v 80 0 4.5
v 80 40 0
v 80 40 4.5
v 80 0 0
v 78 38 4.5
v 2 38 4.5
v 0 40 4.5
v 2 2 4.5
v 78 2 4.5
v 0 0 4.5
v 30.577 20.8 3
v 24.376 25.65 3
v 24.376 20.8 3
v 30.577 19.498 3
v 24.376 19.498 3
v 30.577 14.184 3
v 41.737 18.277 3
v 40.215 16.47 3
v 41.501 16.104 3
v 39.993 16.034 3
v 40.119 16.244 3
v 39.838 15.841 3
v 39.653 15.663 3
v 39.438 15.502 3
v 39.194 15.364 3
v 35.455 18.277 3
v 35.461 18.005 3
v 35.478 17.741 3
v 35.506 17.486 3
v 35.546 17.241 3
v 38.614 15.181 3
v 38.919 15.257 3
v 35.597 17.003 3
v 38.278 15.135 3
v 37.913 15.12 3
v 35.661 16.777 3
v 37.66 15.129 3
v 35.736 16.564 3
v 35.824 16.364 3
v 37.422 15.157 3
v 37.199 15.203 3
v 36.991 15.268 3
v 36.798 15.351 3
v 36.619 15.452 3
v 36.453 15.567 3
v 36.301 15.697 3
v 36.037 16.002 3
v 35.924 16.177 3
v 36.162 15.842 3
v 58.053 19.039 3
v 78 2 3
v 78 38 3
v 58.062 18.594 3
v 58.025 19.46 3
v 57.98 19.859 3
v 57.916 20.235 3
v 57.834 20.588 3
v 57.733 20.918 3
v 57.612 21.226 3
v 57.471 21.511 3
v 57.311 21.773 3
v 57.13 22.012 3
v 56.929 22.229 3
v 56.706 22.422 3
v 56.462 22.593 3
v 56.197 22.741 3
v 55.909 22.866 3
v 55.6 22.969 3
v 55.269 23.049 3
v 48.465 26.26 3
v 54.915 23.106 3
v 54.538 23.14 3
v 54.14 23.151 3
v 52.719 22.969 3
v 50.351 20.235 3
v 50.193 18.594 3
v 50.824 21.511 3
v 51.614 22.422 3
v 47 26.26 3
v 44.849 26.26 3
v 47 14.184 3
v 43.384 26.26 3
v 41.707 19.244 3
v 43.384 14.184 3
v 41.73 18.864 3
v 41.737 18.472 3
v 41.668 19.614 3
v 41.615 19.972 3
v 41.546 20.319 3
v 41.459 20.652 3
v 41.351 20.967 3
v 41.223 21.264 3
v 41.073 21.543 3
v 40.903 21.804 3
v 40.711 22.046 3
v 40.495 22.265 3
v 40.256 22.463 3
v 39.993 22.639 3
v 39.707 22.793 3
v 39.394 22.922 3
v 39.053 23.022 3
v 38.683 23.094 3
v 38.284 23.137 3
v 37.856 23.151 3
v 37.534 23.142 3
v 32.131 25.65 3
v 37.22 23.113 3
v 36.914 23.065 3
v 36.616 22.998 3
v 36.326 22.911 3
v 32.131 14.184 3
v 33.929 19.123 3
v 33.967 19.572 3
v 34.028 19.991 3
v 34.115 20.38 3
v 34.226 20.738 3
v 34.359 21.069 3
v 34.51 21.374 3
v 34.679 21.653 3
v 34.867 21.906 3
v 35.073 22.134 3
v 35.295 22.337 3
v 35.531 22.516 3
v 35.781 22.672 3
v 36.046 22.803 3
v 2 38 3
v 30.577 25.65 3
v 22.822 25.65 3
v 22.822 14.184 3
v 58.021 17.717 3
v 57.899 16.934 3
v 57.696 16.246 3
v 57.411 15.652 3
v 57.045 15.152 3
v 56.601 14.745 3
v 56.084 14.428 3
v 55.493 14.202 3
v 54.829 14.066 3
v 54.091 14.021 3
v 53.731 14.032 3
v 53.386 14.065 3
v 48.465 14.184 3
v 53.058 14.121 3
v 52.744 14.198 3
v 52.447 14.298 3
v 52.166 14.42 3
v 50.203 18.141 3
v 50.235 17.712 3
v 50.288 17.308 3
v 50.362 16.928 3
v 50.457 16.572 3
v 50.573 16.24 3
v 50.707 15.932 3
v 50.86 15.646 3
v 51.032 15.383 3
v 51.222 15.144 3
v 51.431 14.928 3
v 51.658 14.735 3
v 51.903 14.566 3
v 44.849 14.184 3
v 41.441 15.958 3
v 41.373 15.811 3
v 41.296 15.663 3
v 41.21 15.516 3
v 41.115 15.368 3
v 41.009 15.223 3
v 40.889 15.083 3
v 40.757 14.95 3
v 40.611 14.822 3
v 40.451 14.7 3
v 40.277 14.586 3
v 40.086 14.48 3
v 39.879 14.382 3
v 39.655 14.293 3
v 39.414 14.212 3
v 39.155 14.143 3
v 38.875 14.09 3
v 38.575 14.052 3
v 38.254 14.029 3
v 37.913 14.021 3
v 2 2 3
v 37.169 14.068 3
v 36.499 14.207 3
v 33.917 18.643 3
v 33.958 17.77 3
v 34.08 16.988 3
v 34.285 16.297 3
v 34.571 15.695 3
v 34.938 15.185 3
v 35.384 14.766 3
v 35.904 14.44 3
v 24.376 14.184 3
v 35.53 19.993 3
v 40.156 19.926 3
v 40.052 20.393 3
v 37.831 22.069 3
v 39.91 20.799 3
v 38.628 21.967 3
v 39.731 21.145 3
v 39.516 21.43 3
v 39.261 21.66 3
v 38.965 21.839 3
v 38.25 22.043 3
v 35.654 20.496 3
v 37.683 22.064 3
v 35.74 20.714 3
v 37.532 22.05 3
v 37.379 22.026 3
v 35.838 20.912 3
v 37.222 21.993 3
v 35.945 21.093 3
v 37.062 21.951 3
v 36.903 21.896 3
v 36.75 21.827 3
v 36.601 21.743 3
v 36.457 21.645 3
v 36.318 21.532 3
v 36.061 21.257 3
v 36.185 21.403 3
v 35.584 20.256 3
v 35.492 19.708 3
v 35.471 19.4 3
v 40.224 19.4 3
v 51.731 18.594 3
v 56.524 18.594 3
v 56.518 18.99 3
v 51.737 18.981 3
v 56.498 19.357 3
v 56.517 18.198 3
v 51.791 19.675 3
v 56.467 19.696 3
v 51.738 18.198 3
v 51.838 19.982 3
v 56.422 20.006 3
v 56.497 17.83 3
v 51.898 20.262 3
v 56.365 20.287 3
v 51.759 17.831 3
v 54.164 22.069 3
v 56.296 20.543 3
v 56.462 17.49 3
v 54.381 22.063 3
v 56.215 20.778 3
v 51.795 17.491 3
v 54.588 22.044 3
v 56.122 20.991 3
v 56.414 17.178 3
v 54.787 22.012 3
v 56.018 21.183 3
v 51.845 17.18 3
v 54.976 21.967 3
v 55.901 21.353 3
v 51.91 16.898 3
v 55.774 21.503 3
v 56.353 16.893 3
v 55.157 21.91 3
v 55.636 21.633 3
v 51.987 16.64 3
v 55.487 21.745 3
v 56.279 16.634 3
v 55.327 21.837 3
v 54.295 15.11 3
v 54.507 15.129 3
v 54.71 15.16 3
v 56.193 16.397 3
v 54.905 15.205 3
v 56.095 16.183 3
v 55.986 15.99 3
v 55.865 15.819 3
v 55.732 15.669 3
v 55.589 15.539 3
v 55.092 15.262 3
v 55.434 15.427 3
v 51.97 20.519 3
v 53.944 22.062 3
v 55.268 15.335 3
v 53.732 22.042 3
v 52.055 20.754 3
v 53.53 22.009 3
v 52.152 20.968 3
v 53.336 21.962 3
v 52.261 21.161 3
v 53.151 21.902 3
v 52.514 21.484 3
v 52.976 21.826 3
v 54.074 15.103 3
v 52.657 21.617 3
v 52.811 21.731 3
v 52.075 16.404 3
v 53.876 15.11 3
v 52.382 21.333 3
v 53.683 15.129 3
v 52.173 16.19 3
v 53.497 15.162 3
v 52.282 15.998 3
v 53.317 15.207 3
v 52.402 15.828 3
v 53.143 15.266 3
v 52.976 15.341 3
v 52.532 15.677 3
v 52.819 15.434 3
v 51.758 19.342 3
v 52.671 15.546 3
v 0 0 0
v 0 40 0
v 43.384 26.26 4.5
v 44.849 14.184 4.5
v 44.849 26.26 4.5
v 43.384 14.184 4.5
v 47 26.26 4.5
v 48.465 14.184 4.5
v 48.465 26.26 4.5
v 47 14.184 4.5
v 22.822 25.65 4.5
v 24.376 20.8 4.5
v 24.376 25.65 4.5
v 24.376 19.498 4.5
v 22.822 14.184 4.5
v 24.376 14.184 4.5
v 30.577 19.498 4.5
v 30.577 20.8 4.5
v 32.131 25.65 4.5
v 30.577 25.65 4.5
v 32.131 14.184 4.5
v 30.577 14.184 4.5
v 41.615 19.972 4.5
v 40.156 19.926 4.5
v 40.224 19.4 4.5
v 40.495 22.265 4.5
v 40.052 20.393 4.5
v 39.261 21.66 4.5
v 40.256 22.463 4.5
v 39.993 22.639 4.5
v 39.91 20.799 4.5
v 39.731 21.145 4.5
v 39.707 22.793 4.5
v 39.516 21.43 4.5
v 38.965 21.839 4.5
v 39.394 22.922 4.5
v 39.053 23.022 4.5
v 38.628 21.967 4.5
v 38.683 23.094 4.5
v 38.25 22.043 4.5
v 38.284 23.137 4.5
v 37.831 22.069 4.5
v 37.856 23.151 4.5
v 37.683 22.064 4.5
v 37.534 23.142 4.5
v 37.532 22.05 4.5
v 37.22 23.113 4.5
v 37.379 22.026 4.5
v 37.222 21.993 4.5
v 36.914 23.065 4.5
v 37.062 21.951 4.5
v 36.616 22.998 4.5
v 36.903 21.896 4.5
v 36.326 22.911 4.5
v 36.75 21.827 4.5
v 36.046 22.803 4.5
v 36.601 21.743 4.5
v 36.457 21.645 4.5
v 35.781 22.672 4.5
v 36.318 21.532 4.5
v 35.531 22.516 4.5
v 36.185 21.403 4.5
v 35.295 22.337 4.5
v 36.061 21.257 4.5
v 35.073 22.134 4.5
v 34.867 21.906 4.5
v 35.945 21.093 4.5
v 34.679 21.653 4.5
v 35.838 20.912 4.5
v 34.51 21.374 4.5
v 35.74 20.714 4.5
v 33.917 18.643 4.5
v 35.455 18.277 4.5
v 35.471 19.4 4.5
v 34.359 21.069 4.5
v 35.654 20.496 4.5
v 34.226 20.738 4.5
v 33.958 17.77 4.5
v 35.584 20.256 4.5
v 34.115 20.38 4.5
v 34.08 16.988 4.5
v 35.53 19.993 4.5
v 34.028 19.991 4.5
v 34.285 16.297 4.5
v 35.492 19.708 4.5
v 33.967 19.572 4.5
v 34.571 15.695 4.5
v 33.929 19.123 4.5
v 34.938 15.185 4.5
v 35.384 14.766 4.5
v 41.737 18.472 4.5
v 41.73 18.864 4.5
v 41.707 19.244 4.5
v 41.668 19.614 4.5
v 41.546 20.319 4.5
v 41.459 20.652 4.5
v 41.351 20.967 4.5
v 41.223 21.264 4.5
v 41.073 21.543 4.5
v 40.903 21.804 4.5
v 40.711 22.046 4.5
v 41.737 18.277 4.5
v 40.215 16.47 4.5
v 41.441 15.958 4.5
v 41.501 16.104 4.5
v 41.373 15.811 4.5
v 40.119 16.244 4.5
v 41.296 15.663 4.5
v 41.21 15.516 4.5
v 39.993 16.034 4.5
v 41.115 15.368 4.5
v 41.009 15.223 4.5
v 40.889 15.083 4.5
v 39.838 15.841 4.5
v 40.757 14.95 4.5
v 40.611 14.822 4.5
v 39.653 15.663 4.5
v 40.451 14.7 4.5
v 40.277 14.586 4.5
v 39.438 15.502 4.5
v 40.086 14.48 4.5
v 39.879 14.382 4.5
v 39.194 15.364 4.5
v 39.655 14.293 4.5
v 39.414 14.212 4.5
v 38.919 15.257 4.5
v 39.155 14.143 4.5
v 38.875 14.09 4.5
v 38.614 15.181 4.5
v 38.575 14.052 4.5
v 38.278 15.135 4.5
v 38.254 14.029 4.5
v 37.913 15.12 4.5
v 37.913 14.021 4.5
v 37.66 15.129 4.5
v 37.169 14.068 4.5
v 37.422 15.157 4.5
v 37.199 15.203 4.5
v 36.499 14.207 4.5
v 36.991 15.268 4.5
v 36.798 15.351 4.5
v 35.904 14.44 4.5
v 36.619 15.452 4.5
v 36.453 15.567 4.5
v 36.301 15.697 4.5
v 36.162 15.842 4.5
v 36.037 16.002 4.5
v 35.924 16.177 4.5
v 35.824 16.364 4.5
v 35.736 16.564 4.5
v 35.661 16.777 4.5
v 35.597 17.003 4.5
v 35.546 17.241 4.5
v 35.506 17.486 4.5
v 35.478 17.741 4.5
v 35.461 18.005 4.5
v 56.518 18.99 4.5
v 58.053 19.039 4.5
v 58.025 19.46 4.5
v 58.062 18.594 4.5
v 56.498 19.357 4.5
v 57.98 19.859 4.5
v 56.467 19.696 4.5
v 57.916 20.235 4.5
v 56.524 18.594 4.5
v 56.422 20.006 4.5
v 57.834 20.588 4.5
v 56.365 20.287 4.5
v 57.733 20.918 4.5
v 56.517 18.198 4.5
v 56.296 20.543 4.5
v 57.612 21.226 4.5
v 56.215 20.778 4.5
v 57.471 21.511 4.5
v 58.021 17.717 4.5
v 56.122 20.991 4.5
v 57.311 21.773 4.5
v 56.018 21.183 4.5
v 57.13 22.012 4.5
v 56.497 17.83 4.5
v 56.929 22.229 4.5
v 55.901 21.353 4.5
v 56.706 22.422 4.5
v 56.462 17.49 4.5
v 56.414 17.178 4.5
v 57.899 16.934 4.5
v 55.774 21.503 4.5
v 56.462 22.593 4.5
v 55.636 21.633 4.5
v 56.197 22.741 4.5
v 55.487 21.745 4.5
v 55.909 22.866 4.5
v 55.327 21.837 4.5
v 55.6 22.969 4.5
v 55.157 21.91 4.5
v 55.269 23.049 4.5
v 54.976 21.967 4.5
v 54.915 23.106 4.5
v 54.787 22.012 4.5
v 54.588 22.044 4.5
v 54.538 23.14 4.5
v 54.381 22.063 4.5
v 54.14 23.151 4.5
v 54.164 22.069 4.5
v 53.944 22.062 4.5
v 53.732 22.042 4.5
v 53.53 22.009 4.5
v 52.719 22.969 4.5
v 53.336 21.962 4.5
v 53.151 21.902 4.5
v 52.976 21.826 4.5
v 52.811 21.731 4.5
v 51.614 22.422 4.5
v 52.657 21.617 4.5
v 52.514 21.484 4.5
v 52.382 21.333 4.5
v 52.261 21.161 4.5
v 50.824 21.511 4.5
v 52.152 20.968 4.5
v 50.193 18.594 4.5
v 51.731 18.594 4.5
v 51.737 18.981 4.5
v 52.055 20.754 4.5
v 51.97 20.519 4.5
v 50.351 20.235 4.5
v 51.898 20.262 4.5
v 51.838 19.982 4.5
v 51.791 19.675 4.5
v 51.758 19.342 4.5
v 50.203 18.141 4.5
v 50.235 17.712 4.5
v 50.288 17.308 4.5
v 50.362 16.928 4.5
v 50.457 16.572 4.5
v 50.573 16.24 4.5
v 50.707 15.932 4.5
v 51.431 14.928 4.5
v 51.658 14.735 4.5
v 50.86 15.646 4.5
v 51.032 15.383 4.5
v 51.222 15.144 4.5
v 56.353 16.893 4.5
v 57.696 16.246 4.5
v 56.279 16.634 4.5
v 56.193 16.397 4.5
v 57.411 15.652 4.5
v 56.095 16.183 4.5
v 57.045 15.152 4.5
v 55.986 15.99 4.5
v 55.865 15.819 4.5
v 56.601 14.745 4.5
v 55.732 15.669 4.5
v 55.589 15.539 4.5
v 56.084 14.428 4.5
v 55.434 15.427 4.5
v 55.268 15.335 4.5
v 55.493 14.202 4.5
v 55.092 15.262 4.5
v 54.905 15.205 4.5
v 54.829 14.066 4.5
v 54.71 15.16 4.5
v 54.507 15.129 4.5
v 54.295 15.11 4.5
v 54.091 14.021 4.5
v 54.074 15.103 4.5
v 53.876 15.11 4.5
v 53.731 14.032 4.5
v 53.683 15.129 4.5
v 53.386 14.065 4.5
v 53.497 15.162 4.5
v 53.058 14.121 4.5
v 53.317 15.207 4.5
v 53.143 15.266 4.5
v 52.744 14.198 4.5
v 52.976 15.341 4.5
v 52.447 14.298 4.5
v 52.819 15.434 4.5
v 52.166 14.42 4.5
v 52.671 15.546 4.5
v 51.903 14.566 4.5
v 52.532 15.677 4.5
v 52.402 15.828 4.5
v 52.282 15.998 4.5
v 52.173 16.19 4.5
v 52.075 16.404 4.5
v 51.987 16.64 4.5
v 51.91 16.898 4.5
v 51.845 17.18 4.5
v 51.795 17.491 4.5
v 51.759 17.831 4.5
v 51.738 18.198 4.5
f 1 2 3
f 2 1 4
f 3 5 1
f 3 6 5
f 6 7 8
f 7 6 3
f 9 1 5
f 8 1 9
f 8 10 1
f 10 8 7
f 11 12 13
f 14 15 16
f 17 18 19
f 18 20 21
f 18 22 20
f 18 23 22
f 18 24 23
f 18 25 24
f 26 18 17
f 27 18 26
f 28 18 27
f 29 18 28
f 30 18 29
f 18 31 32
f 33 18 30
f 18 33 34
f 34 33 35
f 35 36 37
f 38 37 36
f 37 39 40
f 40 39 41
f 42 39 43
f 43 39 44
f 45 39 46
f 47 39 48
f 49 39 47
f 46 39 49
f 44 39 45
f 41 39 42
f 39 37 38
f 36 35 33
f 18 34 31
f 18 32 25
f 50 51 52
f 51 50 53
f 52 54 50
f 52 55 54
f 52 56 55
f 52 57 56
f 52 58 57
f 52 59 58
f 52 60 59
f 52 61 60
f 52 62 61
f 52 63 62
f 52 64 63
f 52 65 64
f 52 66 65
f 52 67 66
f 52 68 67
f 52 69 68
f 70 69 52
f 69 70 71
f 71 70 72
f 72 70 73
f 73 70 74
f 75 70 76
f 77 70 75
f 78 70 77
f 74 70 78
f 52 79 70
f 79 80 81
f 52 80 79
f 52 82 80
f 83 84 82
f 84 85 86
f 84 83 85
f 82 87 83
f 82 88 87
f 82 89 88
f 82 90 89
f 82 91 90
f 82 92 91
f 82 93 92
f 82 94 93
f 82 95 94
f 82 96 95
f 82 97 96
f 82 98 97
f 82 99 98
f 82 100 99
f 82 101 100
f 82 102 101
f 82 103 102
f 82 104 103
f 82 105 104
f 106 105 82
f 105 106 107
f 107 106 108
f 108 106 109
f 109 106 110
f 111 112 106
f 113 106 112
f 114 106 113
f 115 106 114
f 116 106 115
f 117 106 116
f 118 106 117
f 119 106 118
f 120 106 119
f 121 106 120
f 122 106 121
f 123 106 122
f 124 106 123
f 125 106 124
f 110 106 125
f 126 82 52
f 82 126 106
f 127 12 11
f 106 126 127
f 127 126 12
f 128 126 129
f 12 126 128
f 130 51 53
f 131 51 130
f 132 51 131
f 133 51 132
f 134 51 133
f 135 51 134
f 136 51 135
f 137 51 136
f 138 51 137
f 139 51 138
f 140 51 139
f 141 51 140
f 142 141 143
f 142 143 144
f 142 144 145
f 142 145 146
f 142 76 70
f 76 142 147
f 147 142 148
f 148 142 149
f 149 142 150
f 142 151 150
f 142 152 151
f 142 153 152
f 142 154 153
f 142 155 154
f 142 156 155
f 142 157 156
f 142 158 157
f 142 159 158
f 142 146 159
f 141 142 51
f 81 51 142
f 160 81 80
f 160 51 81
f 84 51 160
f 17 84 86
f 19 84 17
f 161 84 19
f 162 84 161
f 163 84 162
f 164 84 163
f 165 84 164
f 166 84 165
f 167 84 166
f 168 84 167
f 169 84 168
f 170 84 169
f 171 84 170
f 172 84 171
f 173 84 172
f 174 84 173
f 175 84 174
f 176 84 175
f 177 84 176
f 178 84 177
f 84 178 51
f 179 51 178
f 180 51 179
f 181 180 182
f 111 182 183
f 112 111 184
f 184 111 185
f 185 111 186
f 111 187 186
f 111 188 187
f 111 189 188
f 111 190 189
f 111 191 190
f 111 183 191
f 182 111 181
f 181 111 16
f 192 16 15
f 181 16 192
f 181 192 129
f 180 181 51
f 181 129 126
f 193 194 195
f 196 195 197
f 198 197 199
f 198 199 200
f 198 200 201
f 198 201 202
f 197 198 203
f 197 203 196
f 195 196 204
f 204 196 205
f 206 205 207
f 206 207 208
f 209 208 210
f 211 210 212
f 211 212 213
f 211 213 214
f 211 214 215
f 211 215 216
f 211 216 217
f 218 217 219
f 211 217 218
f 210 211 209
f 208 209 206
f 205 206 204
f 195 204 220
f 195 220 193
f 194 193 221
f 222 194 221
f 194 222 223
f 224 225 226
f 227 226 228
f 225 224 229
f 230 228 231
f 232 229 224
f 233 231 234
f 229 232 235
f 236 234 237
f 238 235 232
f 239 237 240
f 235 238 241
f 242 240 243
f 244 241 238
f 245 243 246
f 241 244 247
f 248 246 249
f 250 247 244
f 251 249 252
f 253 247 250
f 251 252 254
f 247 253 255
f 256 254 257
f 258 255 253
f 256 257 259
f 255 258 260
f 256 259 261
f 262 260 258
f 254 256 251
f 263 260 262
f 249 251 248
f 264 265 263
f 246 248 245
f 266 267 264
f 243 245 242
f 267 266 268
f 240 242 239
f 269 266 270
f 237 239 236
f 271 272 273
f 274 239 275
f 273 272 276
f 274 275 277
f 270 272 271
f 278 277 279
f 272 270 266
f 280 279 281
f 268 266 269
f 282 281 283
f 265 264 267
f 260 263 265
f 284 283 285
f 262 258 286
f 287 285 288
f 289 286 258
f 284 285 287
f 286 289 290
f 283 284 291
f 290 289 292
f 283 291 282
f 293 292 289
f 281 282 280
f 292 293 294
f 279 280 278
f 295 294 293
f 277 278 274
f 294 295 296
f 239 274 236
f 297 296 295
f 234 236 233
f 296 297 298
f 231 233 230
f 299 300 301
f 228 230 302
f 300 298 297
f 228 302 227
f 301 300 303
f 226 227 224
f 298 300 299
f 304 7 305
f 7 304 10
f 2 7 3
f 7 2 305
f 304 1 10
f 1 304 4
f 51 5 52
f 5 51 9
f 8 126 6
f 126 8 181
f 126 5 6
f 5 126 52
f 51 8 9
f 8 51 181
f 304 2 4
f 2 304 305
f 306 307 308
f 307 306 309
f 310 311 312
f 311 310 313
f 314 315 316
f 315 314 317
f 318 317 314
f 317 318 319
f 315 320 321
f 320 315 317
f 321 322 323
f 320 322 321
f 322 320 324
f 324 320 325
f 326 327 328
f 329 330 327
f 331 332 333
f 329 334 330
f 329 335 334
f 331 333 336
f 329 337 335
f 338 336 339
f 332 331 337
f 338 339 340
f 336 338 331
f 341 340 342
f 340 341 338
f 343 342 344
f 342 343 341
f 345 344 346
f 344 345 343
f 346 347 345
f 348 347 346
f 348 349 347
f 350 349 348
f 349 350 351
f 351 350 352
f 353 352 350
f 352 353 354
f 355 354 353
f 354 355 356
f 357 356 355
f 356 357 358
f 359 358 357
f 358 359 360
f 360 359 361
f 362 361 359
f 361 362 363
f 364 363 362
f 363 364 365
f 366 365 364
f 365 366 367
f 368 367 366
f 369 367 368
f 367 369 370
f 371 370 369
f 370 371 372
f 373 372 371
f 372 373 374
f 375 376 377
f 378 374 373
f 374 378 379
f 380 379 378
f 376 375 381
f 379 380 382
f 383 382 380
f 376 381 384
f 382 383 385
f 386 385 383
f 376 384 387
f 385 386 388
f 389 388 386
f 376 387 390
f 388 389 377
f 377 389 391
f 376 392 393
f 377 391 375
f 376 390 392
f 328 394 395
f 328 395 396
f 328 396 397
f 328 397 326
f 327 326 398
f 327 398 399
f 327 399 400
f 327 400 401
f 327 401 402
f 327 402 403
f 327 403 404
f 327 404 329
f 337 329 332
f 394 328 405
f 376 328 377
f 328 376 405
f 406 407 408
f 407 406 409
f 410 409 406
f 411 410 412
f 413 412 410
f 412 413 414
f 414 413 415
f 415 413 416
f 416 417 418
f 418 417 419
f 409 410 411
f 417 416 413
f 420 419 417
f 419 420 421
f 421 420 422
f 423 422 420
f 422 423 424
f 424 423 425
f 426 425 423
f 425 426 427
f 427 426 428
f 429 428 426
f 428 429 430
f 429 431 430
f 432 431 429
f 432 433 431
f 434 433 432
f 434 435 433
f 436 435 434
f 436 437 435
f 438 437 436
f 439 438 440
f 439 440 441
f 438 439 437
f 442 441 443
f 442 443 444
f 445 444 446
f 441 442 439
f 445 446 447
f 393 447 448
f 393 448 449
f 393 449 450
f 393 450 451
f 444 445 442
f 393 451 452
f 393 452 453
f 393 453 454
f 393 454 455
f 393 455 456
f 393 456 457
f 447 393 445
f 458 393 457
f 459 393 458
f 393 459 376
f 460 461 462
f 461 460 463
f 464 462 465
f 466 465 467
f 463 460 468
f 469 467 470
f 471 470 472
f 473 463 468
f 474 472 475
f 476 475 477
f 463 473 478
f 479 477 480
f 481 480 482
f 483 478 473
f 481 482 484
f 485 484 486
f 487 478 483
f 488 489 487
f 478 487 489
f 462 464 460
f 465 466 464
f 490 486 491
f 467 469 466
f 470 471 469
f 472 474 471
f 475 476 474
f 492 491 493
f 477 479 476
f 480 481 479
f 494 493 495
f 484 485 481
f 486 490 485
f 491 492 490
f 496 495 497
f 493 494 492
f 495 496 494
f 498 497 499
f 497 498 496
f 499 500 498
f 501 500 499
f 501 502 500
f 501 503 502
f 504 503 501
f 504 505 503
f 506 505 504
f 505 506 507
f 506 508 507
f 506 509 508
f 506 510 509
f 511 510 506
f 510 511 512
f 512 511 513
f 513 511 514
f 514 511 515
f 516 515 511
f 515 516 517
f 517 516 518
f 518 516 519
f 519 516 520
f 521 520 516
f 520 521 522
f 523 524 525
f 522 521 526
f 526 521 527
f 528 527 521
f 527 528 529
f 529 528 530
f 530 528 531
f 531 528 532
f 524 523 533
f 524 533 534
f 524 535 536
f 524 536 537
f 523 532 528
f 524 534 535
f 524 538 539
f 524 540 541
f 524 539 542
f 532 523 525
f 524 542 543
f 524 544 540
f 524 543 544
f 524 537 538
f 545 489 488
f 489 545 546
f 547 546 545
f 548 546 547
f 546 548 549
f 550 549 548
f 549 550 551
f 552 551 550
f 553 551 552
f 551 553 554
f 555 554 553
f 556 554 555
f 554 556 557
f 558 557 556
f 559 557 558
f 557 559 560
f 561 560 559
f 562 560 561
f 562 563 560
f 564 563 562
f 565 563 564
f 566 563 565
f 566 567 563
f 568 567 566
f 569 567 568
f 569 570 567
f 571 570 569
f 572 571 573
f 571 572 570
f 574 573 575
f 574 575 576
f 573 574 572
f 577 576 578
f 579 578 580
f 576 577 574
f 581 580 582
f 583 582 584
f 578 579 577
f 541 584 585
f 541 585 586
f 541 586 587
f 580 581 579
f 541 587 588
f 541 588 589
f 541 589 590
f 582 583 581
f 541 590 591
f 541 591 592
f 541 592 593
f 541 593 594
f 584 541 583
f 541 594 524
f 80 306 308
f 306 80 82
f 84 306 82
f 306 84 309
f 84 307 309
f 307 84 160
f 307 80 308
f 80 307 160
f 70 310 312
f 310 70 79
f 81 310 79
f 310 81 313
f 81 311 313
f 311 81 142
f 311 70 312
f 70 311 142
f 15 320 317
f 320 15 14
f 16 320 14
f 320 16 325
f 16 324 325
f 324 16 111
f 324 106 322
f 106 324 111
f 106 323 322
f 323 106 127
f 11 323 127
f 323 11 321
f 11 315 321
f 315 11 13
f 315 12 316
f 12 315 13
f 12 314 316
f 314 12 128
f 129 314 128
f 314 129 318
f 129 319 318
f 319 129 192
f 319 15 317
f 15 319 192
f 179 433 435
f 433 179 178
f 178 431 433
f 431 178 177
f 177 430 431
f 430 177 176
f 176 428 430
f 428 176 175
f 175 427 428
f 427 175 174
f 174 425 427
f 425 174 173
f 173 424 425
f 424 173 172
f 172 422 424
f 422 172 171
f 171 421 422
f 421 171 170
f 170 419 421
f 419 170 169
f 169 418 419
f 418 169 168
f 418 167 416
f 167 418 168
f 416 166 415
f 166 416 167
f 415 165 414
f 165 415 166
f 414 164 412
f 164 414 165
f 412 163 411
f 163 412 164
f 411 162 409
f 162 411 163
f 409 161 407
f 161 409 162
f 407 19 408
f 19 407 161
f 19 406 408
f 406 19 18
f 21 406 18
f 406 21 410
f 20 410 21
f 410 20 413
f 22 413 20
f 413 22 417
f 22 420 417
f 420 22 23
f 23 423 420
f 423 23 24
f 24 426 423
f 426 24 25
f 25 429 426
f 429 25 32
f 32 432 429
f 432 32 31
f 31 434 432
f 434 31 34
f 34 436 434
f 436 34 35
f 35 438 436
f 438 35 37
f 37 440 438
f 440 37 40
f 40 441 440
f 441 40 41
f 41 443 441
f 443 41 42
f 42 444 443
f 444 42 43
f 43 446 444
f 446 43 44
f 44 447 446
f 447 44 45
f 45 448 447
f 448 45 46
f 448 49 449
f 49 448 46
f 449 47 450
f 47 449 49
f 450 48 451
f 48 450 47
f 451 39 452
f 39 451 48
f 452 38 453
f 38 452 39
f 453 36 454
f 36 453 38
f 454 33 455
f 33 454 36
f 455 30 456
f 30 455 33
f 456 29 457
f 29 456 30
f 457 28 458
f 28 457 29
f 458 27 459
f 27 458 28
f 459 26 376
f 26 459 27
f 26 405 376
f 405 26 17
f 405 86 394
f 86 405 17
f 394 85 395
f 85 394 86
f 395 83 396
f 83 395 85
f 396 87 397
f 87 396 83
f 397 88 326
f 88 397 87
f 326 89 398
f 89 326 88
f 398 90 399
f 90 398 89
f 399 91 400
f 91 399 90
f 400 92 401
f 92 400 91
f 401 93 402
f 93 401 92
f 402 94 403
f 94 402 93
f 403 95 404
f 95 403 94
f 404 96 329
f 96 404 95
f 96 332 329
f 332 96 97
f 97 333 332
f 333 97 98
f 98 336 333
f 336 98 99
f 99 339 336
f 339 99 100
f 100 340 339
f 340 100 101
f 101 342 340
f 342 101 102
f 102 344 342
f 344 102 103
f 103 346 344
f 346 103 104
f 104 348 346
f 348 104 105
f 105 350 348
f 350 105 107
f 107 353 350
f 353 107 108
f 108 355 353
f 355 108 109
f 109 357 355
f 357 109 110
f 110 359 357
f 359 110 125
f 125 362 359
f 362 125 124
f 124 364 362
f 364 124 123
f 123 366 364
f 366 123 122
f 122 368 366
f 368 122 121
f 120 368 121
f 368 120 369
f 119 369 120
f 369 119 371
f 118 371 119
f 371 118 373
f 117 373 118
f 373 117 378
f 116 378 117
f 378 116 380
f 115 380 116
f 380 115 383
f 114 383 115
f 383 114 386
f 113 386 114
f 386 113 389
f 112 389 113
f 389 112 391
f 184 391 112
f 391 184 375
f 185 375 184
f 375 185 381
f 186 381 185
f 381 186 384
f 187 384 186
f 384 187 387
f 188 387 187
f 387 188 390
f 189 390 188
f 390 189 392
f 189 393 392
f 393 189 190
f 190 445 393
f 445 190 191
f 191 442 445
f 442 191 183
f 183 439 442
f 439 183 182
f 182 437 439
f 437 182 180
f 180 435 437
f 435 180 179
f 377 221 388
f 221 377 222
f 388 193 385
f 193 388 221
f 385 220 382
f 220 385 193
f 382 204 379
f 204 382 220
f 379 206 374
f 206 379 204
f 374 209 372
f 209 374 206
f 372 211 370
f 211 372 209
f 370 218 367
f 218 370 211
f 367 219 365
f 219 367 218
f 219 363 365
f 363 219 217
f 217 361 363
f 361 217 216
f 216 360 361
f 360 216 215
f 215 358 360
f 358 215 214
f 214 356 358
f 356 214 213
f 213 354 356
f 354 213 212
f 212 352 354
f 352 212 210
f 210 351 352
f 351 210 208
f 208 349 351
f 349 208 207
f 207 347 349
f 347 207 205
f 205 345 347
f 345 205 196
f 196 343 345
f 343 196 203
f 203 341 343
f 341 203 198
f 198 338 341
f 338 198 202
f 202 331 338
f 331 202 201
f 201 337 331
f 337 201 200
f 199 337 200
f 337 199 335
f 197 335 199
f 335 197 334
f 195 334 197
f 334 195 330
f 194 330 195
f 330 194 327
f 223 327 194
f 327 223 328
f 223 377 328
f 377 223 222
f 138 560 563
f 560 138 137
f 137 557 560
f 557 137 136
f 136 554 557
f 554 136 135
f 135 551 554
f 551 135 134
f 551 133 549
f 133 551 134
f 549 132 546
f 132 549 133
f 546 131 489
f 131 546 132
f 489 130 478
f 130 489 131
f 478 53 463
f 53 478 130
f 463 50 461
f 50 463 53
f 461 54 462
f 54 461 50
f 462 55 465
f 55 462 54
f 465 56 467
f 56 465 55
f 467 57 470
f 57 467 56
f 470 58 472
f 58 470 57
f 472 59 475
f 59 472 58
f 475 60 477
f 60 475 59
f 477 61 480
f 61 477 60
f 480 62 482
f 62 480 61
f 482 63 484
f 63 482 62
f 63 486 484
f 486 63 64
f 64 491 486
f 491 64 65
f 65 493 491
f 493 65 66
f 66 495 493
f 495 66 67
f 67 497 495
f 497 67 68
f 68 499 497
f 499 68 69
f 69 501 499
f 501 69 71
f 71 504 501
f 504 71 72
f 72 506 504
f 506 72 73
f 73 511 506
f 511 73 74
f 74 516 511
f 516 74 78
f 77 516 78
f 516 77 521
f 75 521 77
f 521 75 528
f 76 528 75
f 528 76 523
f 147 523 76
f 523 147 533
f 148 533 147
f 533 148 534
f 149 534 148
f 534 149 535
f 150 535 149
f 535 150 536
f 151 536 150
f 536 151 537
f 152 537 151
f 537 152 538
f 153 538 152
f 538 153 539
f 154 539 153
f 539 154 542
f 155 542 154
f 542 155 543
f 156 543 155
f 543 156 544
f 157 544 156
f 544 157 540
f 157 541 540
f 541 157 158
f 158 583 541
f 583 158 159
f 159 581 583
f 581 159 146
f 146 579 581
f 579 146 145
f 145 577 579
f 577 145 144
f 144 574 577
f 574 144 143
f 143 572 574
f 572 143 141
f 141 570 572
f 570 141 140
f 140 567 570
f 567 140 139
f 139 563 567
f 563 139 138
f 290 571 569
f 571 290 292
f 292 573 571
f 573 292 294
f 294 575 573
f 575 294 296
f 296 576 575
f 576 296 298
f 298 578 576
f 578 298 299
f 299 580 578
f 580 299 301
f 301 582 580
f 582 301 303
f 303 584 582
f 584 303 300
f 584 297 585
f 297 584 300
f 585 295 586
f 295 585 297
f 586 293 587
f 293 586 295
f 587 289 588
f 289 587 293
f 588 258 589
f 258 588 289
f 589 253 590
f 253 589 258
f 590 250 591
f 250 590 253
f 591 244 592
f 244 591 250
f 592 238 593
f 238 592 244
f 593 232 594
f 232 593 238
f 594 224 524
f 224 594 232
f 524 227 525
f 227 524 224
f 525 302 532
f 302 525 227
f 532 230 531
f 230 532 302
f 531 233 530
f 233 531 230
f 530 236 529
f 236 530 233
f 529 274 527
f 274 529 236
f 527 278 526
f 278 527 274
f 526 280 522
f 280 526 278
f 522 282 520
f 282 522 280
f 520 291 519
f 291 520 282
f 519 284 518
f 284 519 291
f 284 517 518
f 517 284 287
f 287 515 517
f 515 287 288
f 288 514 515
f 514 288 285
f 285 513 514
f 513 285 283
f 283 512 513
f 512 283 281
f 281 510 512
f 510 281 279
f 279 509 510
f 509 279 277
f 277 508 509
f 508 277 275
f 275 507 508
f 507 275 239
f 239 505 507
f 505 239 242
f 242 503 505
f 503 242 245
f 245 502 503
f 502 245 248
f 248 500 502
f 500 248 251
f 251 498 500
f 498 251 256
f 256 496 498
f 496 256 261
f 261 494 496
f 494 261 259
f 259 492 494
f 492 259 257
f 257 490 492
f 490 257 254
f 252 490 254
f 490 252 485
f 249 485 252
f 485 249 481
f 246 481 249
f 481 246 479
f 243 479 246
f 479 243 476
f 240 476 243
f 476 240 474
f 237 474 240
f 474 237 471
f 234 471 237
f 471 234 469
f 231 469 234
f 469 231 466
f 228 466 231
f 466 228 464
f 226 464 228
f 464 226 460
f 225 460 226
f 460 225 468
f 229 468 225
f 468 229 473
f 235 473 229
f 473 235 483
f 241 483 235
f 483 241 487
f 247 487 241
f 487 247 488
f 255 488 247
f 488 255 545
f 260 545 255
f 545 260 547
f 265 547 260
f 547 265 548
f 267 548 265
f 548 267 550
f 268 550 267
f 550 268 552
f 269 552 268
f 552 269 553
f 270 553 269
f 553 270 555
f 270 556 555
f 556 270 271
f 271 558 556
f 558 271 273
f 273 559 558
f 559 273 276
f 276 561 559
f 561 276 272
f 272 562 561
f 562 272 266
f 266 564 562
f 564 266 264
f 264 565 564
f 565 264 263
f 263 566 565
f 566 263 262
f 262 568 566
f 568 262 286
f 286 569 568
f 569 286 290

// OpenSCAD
// Qubic wrapper — Sign with Border
// Larger plate with decorative border frame and text

message = "Hello";
font_size = 12;
text_depth = 1.5;
base_width = 80;
base_height = 40;
base_thickness = 3;
raised = true;
border_width = 2;
fn = 0;
render_mode = 0;

$fn = fn > 0 ? fn : 32;

module sign_base() {
    cube([base_width, base_height, base_thickness]);
}

module border_frame() {
    // Raised border around the edge
    difference() {
        cube([base_width, base_height, text_depth]);
        translate([border_width, border_width, -0.1])
            cube([base_width - border_width * 2,
                  base_height - border_width * 2,
                  text_depth + 0.2]);
    }
}

if (raised) {
    union() {
        sign_base();
        // Border frame on top
        translate([0, 0, base_thickness])
            border_frame();
        // Raised text
        translate([base_width / 2, base_height / 2, base_thickness])
            linear_extrude(text_depth)
                text(message, size = font_size, halign = "center", valign = "center");
    }
} else {
    difference() {
        union() {
            sign_base();
            // Border frame on top
            translate([0, 0, base_thickness])
                border_frame();
        }
        // Inset text
        translate([base_width / 2, base_height / 2, base_thickness - text_depth])
            linear_extrude(text_depth + 0.1)
                text(message, size = font_size, halign = "center", valign = "center");
    }
}
